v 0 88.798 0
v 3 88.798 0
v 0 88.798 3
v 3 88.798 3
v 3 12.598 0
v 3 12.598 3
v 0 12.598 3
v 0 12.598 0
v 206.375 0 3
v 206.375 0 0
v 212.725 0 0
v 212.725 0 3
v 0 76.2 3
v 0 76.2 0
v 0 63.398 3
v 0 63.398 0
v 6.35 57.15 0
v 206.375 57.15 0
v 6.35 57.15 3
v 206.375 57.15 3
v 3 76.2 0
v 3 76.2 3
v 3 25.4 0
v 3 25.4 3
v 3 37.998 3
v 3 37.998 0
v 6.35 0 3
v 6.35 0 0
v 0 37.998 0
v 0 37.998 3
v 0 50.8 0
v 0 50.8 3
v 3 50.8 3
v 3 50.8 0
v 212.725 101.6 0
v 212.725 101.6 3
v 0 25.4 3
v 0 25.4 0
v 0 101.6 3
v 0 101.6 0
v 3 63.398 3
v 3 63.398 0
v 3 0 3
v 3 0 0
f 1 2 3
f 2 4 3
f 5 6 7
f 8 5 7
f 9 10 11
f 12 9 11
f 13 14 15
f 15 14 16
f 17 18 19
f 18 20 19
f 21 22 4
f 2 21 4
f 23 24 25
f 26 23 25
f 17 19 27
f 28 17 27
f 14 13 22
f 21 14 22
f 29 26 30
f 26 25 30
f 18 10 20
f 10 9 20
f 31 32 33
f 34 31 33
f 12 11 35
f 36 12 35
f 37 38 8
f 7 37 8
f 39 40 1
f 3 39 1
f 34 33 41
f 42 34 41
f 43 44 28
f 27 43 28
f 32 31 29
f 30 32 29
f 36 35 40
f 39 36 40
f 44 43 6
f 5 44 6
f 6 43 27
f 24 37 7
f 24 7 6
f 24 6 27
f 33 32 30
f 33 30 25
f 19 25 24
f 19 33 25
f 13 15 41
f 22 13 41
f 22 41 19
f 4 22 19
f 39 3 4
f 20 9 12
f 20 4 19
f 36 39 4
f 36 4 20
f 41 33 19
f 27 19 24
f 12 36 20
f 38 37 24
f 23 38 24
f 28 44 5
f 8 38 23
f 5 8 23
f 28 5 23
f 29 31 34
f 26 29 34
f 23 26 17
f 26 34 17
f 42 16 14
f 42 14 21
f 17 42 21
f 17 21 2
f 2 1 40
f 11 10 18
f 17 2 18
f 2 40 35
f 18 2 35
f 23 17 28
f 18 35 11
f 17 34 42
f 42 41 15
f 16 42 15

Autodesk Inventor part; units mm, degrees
ref_plane "YZ Plane" through (0, 0, 0) normal (1, 0, 0) x (0, 1, 0)
ref_plane "XZ Plane" through (0, 0, 0) normal (0, 1, 0) x (-1, 0, 0)
ref_plane "XY Plane" through (0, 0, 0) normal (0, 0, 1) x (1, 0, 0)
sketch "Sketch1" plane through (0, 0, 0) normal (0, 0, 1) x (1, 0, 0)
  line L0 (0, 0) -> (212.725, 0)
  line L1 (212.725, 0) -> (212.725, 101.6)
  line L2 (212.725, 101.6) -> (0, 101.6)
  line L3 (0, 101.6) -> (0, 0)
  dimension "d0" = 212.725
  dimension "d1" = 101.6
extrude "Extrusion1" add sketch "Sketch1" along normal blind 3
sketch "Sketch2" plane through (0, 0, 3) normal (0, 0, 1) x (1, 0, 0)
  line L0 (6.35, 0) -> (206.375, 0)
  line L1 (206.375, 0) -> (206.375, 57.15)
  line L2 (206.375, 57.15) -> (6.35, 57.15)
  line L3 (6.35, 57.15) -> (6.35, 0)
  line L4 (0, 0) -> (212.725, 0) projected
  line L5 (212.725, 0) -> (212.725, 101.6) projected
  line L6 (212.725, 101.6) -> (0, 101.6) projected
  line L7 (0, 101.6) -> (0, 0) projected
  dimension "d4" = 57.15
  dimension "d9" = 6.35
  dimension "d10" = 6.35
extrude "Extrusion2" cut sketch "Sketch2" against normal blind 3.5 contours L3 L2 L1 L0
sketch "Sketch3" plane through (0, 0, 3) normal (0, 0, 1) x (1, 0, 0)
  line L0 (206.375, 57.15) -> (206.375, 0) projected
  line L1 (206.375, 0) -> (212.725, 0) projected
  line L2 (212.725, 0) -> (212.725, 101.6) projected
  line L3 (212.725, 101.6) -> (0, 101.6) projected
  line L4 (0, 101.6) -> (0, 0) projected
  line L5 (0, 0) -> (6.35, 0) projected
  line L6 (6.35, 0) -> (6.35, 57.15) projected
  line L7 (6.35, 57.15) -> (206.375, 57.15) projected
  line L8 (0, 0) -> (3, 0)
  line L9 (3, 0) -> (3, 12.5984)
  line L10 (3, 12.5984) -> (0, 12.5984)
  line L11 (0, 12.5984) -> (0, 0)
  line L12 (3, 25.4) -> (3, 37.9984)
  line L13 (3, 37.9984) -> (0, 37.9984)
  line L14 (0, 37.9984) -> (0, 25.4)
  line L15 (0, 25.4) -> (3, 25.4)
  line L16 (3, 50.8) -> (3, 63.3984)
  line L17 (3, 63.3984) -> (0, 63.3984)
  line L18 (0, 63.3984) -> (0, 50.8)
  line L19 (0, 50.8) -> (3, 50.8)
  line L20 (3, 76.2) -> (3, 88.7984)
  line L21 (3, 88.7984) -> (0, 88.7984)
  line L22 (0, 88.7984) -> (0, 76.2)
  line L23 (0, 76.2) -> (3, 76.2)
  line L24 (3, 101.6) -> (3, 114.1984)
  line L25 (3, 114.1984) -> (0, 114.1984)
  line L26 (0, 114.1984) -> (0, 101.6)
  line L27 (0, 101.6) -> (3, 101.6)
  dimension "d11" = 12.5984
  dimension "d12" = 3
  dimension "d15" = 25.4
extrude "Extrusion3" cut sketch "Sketch3" against normal blind 3 contours L5 L4 L10 L9 | L3 L26 L25 L24 | L21 L20 L23 L4 | L4 L13 L12 L15 | L17 L16 L19 L4
properties part number "PCBWall"
